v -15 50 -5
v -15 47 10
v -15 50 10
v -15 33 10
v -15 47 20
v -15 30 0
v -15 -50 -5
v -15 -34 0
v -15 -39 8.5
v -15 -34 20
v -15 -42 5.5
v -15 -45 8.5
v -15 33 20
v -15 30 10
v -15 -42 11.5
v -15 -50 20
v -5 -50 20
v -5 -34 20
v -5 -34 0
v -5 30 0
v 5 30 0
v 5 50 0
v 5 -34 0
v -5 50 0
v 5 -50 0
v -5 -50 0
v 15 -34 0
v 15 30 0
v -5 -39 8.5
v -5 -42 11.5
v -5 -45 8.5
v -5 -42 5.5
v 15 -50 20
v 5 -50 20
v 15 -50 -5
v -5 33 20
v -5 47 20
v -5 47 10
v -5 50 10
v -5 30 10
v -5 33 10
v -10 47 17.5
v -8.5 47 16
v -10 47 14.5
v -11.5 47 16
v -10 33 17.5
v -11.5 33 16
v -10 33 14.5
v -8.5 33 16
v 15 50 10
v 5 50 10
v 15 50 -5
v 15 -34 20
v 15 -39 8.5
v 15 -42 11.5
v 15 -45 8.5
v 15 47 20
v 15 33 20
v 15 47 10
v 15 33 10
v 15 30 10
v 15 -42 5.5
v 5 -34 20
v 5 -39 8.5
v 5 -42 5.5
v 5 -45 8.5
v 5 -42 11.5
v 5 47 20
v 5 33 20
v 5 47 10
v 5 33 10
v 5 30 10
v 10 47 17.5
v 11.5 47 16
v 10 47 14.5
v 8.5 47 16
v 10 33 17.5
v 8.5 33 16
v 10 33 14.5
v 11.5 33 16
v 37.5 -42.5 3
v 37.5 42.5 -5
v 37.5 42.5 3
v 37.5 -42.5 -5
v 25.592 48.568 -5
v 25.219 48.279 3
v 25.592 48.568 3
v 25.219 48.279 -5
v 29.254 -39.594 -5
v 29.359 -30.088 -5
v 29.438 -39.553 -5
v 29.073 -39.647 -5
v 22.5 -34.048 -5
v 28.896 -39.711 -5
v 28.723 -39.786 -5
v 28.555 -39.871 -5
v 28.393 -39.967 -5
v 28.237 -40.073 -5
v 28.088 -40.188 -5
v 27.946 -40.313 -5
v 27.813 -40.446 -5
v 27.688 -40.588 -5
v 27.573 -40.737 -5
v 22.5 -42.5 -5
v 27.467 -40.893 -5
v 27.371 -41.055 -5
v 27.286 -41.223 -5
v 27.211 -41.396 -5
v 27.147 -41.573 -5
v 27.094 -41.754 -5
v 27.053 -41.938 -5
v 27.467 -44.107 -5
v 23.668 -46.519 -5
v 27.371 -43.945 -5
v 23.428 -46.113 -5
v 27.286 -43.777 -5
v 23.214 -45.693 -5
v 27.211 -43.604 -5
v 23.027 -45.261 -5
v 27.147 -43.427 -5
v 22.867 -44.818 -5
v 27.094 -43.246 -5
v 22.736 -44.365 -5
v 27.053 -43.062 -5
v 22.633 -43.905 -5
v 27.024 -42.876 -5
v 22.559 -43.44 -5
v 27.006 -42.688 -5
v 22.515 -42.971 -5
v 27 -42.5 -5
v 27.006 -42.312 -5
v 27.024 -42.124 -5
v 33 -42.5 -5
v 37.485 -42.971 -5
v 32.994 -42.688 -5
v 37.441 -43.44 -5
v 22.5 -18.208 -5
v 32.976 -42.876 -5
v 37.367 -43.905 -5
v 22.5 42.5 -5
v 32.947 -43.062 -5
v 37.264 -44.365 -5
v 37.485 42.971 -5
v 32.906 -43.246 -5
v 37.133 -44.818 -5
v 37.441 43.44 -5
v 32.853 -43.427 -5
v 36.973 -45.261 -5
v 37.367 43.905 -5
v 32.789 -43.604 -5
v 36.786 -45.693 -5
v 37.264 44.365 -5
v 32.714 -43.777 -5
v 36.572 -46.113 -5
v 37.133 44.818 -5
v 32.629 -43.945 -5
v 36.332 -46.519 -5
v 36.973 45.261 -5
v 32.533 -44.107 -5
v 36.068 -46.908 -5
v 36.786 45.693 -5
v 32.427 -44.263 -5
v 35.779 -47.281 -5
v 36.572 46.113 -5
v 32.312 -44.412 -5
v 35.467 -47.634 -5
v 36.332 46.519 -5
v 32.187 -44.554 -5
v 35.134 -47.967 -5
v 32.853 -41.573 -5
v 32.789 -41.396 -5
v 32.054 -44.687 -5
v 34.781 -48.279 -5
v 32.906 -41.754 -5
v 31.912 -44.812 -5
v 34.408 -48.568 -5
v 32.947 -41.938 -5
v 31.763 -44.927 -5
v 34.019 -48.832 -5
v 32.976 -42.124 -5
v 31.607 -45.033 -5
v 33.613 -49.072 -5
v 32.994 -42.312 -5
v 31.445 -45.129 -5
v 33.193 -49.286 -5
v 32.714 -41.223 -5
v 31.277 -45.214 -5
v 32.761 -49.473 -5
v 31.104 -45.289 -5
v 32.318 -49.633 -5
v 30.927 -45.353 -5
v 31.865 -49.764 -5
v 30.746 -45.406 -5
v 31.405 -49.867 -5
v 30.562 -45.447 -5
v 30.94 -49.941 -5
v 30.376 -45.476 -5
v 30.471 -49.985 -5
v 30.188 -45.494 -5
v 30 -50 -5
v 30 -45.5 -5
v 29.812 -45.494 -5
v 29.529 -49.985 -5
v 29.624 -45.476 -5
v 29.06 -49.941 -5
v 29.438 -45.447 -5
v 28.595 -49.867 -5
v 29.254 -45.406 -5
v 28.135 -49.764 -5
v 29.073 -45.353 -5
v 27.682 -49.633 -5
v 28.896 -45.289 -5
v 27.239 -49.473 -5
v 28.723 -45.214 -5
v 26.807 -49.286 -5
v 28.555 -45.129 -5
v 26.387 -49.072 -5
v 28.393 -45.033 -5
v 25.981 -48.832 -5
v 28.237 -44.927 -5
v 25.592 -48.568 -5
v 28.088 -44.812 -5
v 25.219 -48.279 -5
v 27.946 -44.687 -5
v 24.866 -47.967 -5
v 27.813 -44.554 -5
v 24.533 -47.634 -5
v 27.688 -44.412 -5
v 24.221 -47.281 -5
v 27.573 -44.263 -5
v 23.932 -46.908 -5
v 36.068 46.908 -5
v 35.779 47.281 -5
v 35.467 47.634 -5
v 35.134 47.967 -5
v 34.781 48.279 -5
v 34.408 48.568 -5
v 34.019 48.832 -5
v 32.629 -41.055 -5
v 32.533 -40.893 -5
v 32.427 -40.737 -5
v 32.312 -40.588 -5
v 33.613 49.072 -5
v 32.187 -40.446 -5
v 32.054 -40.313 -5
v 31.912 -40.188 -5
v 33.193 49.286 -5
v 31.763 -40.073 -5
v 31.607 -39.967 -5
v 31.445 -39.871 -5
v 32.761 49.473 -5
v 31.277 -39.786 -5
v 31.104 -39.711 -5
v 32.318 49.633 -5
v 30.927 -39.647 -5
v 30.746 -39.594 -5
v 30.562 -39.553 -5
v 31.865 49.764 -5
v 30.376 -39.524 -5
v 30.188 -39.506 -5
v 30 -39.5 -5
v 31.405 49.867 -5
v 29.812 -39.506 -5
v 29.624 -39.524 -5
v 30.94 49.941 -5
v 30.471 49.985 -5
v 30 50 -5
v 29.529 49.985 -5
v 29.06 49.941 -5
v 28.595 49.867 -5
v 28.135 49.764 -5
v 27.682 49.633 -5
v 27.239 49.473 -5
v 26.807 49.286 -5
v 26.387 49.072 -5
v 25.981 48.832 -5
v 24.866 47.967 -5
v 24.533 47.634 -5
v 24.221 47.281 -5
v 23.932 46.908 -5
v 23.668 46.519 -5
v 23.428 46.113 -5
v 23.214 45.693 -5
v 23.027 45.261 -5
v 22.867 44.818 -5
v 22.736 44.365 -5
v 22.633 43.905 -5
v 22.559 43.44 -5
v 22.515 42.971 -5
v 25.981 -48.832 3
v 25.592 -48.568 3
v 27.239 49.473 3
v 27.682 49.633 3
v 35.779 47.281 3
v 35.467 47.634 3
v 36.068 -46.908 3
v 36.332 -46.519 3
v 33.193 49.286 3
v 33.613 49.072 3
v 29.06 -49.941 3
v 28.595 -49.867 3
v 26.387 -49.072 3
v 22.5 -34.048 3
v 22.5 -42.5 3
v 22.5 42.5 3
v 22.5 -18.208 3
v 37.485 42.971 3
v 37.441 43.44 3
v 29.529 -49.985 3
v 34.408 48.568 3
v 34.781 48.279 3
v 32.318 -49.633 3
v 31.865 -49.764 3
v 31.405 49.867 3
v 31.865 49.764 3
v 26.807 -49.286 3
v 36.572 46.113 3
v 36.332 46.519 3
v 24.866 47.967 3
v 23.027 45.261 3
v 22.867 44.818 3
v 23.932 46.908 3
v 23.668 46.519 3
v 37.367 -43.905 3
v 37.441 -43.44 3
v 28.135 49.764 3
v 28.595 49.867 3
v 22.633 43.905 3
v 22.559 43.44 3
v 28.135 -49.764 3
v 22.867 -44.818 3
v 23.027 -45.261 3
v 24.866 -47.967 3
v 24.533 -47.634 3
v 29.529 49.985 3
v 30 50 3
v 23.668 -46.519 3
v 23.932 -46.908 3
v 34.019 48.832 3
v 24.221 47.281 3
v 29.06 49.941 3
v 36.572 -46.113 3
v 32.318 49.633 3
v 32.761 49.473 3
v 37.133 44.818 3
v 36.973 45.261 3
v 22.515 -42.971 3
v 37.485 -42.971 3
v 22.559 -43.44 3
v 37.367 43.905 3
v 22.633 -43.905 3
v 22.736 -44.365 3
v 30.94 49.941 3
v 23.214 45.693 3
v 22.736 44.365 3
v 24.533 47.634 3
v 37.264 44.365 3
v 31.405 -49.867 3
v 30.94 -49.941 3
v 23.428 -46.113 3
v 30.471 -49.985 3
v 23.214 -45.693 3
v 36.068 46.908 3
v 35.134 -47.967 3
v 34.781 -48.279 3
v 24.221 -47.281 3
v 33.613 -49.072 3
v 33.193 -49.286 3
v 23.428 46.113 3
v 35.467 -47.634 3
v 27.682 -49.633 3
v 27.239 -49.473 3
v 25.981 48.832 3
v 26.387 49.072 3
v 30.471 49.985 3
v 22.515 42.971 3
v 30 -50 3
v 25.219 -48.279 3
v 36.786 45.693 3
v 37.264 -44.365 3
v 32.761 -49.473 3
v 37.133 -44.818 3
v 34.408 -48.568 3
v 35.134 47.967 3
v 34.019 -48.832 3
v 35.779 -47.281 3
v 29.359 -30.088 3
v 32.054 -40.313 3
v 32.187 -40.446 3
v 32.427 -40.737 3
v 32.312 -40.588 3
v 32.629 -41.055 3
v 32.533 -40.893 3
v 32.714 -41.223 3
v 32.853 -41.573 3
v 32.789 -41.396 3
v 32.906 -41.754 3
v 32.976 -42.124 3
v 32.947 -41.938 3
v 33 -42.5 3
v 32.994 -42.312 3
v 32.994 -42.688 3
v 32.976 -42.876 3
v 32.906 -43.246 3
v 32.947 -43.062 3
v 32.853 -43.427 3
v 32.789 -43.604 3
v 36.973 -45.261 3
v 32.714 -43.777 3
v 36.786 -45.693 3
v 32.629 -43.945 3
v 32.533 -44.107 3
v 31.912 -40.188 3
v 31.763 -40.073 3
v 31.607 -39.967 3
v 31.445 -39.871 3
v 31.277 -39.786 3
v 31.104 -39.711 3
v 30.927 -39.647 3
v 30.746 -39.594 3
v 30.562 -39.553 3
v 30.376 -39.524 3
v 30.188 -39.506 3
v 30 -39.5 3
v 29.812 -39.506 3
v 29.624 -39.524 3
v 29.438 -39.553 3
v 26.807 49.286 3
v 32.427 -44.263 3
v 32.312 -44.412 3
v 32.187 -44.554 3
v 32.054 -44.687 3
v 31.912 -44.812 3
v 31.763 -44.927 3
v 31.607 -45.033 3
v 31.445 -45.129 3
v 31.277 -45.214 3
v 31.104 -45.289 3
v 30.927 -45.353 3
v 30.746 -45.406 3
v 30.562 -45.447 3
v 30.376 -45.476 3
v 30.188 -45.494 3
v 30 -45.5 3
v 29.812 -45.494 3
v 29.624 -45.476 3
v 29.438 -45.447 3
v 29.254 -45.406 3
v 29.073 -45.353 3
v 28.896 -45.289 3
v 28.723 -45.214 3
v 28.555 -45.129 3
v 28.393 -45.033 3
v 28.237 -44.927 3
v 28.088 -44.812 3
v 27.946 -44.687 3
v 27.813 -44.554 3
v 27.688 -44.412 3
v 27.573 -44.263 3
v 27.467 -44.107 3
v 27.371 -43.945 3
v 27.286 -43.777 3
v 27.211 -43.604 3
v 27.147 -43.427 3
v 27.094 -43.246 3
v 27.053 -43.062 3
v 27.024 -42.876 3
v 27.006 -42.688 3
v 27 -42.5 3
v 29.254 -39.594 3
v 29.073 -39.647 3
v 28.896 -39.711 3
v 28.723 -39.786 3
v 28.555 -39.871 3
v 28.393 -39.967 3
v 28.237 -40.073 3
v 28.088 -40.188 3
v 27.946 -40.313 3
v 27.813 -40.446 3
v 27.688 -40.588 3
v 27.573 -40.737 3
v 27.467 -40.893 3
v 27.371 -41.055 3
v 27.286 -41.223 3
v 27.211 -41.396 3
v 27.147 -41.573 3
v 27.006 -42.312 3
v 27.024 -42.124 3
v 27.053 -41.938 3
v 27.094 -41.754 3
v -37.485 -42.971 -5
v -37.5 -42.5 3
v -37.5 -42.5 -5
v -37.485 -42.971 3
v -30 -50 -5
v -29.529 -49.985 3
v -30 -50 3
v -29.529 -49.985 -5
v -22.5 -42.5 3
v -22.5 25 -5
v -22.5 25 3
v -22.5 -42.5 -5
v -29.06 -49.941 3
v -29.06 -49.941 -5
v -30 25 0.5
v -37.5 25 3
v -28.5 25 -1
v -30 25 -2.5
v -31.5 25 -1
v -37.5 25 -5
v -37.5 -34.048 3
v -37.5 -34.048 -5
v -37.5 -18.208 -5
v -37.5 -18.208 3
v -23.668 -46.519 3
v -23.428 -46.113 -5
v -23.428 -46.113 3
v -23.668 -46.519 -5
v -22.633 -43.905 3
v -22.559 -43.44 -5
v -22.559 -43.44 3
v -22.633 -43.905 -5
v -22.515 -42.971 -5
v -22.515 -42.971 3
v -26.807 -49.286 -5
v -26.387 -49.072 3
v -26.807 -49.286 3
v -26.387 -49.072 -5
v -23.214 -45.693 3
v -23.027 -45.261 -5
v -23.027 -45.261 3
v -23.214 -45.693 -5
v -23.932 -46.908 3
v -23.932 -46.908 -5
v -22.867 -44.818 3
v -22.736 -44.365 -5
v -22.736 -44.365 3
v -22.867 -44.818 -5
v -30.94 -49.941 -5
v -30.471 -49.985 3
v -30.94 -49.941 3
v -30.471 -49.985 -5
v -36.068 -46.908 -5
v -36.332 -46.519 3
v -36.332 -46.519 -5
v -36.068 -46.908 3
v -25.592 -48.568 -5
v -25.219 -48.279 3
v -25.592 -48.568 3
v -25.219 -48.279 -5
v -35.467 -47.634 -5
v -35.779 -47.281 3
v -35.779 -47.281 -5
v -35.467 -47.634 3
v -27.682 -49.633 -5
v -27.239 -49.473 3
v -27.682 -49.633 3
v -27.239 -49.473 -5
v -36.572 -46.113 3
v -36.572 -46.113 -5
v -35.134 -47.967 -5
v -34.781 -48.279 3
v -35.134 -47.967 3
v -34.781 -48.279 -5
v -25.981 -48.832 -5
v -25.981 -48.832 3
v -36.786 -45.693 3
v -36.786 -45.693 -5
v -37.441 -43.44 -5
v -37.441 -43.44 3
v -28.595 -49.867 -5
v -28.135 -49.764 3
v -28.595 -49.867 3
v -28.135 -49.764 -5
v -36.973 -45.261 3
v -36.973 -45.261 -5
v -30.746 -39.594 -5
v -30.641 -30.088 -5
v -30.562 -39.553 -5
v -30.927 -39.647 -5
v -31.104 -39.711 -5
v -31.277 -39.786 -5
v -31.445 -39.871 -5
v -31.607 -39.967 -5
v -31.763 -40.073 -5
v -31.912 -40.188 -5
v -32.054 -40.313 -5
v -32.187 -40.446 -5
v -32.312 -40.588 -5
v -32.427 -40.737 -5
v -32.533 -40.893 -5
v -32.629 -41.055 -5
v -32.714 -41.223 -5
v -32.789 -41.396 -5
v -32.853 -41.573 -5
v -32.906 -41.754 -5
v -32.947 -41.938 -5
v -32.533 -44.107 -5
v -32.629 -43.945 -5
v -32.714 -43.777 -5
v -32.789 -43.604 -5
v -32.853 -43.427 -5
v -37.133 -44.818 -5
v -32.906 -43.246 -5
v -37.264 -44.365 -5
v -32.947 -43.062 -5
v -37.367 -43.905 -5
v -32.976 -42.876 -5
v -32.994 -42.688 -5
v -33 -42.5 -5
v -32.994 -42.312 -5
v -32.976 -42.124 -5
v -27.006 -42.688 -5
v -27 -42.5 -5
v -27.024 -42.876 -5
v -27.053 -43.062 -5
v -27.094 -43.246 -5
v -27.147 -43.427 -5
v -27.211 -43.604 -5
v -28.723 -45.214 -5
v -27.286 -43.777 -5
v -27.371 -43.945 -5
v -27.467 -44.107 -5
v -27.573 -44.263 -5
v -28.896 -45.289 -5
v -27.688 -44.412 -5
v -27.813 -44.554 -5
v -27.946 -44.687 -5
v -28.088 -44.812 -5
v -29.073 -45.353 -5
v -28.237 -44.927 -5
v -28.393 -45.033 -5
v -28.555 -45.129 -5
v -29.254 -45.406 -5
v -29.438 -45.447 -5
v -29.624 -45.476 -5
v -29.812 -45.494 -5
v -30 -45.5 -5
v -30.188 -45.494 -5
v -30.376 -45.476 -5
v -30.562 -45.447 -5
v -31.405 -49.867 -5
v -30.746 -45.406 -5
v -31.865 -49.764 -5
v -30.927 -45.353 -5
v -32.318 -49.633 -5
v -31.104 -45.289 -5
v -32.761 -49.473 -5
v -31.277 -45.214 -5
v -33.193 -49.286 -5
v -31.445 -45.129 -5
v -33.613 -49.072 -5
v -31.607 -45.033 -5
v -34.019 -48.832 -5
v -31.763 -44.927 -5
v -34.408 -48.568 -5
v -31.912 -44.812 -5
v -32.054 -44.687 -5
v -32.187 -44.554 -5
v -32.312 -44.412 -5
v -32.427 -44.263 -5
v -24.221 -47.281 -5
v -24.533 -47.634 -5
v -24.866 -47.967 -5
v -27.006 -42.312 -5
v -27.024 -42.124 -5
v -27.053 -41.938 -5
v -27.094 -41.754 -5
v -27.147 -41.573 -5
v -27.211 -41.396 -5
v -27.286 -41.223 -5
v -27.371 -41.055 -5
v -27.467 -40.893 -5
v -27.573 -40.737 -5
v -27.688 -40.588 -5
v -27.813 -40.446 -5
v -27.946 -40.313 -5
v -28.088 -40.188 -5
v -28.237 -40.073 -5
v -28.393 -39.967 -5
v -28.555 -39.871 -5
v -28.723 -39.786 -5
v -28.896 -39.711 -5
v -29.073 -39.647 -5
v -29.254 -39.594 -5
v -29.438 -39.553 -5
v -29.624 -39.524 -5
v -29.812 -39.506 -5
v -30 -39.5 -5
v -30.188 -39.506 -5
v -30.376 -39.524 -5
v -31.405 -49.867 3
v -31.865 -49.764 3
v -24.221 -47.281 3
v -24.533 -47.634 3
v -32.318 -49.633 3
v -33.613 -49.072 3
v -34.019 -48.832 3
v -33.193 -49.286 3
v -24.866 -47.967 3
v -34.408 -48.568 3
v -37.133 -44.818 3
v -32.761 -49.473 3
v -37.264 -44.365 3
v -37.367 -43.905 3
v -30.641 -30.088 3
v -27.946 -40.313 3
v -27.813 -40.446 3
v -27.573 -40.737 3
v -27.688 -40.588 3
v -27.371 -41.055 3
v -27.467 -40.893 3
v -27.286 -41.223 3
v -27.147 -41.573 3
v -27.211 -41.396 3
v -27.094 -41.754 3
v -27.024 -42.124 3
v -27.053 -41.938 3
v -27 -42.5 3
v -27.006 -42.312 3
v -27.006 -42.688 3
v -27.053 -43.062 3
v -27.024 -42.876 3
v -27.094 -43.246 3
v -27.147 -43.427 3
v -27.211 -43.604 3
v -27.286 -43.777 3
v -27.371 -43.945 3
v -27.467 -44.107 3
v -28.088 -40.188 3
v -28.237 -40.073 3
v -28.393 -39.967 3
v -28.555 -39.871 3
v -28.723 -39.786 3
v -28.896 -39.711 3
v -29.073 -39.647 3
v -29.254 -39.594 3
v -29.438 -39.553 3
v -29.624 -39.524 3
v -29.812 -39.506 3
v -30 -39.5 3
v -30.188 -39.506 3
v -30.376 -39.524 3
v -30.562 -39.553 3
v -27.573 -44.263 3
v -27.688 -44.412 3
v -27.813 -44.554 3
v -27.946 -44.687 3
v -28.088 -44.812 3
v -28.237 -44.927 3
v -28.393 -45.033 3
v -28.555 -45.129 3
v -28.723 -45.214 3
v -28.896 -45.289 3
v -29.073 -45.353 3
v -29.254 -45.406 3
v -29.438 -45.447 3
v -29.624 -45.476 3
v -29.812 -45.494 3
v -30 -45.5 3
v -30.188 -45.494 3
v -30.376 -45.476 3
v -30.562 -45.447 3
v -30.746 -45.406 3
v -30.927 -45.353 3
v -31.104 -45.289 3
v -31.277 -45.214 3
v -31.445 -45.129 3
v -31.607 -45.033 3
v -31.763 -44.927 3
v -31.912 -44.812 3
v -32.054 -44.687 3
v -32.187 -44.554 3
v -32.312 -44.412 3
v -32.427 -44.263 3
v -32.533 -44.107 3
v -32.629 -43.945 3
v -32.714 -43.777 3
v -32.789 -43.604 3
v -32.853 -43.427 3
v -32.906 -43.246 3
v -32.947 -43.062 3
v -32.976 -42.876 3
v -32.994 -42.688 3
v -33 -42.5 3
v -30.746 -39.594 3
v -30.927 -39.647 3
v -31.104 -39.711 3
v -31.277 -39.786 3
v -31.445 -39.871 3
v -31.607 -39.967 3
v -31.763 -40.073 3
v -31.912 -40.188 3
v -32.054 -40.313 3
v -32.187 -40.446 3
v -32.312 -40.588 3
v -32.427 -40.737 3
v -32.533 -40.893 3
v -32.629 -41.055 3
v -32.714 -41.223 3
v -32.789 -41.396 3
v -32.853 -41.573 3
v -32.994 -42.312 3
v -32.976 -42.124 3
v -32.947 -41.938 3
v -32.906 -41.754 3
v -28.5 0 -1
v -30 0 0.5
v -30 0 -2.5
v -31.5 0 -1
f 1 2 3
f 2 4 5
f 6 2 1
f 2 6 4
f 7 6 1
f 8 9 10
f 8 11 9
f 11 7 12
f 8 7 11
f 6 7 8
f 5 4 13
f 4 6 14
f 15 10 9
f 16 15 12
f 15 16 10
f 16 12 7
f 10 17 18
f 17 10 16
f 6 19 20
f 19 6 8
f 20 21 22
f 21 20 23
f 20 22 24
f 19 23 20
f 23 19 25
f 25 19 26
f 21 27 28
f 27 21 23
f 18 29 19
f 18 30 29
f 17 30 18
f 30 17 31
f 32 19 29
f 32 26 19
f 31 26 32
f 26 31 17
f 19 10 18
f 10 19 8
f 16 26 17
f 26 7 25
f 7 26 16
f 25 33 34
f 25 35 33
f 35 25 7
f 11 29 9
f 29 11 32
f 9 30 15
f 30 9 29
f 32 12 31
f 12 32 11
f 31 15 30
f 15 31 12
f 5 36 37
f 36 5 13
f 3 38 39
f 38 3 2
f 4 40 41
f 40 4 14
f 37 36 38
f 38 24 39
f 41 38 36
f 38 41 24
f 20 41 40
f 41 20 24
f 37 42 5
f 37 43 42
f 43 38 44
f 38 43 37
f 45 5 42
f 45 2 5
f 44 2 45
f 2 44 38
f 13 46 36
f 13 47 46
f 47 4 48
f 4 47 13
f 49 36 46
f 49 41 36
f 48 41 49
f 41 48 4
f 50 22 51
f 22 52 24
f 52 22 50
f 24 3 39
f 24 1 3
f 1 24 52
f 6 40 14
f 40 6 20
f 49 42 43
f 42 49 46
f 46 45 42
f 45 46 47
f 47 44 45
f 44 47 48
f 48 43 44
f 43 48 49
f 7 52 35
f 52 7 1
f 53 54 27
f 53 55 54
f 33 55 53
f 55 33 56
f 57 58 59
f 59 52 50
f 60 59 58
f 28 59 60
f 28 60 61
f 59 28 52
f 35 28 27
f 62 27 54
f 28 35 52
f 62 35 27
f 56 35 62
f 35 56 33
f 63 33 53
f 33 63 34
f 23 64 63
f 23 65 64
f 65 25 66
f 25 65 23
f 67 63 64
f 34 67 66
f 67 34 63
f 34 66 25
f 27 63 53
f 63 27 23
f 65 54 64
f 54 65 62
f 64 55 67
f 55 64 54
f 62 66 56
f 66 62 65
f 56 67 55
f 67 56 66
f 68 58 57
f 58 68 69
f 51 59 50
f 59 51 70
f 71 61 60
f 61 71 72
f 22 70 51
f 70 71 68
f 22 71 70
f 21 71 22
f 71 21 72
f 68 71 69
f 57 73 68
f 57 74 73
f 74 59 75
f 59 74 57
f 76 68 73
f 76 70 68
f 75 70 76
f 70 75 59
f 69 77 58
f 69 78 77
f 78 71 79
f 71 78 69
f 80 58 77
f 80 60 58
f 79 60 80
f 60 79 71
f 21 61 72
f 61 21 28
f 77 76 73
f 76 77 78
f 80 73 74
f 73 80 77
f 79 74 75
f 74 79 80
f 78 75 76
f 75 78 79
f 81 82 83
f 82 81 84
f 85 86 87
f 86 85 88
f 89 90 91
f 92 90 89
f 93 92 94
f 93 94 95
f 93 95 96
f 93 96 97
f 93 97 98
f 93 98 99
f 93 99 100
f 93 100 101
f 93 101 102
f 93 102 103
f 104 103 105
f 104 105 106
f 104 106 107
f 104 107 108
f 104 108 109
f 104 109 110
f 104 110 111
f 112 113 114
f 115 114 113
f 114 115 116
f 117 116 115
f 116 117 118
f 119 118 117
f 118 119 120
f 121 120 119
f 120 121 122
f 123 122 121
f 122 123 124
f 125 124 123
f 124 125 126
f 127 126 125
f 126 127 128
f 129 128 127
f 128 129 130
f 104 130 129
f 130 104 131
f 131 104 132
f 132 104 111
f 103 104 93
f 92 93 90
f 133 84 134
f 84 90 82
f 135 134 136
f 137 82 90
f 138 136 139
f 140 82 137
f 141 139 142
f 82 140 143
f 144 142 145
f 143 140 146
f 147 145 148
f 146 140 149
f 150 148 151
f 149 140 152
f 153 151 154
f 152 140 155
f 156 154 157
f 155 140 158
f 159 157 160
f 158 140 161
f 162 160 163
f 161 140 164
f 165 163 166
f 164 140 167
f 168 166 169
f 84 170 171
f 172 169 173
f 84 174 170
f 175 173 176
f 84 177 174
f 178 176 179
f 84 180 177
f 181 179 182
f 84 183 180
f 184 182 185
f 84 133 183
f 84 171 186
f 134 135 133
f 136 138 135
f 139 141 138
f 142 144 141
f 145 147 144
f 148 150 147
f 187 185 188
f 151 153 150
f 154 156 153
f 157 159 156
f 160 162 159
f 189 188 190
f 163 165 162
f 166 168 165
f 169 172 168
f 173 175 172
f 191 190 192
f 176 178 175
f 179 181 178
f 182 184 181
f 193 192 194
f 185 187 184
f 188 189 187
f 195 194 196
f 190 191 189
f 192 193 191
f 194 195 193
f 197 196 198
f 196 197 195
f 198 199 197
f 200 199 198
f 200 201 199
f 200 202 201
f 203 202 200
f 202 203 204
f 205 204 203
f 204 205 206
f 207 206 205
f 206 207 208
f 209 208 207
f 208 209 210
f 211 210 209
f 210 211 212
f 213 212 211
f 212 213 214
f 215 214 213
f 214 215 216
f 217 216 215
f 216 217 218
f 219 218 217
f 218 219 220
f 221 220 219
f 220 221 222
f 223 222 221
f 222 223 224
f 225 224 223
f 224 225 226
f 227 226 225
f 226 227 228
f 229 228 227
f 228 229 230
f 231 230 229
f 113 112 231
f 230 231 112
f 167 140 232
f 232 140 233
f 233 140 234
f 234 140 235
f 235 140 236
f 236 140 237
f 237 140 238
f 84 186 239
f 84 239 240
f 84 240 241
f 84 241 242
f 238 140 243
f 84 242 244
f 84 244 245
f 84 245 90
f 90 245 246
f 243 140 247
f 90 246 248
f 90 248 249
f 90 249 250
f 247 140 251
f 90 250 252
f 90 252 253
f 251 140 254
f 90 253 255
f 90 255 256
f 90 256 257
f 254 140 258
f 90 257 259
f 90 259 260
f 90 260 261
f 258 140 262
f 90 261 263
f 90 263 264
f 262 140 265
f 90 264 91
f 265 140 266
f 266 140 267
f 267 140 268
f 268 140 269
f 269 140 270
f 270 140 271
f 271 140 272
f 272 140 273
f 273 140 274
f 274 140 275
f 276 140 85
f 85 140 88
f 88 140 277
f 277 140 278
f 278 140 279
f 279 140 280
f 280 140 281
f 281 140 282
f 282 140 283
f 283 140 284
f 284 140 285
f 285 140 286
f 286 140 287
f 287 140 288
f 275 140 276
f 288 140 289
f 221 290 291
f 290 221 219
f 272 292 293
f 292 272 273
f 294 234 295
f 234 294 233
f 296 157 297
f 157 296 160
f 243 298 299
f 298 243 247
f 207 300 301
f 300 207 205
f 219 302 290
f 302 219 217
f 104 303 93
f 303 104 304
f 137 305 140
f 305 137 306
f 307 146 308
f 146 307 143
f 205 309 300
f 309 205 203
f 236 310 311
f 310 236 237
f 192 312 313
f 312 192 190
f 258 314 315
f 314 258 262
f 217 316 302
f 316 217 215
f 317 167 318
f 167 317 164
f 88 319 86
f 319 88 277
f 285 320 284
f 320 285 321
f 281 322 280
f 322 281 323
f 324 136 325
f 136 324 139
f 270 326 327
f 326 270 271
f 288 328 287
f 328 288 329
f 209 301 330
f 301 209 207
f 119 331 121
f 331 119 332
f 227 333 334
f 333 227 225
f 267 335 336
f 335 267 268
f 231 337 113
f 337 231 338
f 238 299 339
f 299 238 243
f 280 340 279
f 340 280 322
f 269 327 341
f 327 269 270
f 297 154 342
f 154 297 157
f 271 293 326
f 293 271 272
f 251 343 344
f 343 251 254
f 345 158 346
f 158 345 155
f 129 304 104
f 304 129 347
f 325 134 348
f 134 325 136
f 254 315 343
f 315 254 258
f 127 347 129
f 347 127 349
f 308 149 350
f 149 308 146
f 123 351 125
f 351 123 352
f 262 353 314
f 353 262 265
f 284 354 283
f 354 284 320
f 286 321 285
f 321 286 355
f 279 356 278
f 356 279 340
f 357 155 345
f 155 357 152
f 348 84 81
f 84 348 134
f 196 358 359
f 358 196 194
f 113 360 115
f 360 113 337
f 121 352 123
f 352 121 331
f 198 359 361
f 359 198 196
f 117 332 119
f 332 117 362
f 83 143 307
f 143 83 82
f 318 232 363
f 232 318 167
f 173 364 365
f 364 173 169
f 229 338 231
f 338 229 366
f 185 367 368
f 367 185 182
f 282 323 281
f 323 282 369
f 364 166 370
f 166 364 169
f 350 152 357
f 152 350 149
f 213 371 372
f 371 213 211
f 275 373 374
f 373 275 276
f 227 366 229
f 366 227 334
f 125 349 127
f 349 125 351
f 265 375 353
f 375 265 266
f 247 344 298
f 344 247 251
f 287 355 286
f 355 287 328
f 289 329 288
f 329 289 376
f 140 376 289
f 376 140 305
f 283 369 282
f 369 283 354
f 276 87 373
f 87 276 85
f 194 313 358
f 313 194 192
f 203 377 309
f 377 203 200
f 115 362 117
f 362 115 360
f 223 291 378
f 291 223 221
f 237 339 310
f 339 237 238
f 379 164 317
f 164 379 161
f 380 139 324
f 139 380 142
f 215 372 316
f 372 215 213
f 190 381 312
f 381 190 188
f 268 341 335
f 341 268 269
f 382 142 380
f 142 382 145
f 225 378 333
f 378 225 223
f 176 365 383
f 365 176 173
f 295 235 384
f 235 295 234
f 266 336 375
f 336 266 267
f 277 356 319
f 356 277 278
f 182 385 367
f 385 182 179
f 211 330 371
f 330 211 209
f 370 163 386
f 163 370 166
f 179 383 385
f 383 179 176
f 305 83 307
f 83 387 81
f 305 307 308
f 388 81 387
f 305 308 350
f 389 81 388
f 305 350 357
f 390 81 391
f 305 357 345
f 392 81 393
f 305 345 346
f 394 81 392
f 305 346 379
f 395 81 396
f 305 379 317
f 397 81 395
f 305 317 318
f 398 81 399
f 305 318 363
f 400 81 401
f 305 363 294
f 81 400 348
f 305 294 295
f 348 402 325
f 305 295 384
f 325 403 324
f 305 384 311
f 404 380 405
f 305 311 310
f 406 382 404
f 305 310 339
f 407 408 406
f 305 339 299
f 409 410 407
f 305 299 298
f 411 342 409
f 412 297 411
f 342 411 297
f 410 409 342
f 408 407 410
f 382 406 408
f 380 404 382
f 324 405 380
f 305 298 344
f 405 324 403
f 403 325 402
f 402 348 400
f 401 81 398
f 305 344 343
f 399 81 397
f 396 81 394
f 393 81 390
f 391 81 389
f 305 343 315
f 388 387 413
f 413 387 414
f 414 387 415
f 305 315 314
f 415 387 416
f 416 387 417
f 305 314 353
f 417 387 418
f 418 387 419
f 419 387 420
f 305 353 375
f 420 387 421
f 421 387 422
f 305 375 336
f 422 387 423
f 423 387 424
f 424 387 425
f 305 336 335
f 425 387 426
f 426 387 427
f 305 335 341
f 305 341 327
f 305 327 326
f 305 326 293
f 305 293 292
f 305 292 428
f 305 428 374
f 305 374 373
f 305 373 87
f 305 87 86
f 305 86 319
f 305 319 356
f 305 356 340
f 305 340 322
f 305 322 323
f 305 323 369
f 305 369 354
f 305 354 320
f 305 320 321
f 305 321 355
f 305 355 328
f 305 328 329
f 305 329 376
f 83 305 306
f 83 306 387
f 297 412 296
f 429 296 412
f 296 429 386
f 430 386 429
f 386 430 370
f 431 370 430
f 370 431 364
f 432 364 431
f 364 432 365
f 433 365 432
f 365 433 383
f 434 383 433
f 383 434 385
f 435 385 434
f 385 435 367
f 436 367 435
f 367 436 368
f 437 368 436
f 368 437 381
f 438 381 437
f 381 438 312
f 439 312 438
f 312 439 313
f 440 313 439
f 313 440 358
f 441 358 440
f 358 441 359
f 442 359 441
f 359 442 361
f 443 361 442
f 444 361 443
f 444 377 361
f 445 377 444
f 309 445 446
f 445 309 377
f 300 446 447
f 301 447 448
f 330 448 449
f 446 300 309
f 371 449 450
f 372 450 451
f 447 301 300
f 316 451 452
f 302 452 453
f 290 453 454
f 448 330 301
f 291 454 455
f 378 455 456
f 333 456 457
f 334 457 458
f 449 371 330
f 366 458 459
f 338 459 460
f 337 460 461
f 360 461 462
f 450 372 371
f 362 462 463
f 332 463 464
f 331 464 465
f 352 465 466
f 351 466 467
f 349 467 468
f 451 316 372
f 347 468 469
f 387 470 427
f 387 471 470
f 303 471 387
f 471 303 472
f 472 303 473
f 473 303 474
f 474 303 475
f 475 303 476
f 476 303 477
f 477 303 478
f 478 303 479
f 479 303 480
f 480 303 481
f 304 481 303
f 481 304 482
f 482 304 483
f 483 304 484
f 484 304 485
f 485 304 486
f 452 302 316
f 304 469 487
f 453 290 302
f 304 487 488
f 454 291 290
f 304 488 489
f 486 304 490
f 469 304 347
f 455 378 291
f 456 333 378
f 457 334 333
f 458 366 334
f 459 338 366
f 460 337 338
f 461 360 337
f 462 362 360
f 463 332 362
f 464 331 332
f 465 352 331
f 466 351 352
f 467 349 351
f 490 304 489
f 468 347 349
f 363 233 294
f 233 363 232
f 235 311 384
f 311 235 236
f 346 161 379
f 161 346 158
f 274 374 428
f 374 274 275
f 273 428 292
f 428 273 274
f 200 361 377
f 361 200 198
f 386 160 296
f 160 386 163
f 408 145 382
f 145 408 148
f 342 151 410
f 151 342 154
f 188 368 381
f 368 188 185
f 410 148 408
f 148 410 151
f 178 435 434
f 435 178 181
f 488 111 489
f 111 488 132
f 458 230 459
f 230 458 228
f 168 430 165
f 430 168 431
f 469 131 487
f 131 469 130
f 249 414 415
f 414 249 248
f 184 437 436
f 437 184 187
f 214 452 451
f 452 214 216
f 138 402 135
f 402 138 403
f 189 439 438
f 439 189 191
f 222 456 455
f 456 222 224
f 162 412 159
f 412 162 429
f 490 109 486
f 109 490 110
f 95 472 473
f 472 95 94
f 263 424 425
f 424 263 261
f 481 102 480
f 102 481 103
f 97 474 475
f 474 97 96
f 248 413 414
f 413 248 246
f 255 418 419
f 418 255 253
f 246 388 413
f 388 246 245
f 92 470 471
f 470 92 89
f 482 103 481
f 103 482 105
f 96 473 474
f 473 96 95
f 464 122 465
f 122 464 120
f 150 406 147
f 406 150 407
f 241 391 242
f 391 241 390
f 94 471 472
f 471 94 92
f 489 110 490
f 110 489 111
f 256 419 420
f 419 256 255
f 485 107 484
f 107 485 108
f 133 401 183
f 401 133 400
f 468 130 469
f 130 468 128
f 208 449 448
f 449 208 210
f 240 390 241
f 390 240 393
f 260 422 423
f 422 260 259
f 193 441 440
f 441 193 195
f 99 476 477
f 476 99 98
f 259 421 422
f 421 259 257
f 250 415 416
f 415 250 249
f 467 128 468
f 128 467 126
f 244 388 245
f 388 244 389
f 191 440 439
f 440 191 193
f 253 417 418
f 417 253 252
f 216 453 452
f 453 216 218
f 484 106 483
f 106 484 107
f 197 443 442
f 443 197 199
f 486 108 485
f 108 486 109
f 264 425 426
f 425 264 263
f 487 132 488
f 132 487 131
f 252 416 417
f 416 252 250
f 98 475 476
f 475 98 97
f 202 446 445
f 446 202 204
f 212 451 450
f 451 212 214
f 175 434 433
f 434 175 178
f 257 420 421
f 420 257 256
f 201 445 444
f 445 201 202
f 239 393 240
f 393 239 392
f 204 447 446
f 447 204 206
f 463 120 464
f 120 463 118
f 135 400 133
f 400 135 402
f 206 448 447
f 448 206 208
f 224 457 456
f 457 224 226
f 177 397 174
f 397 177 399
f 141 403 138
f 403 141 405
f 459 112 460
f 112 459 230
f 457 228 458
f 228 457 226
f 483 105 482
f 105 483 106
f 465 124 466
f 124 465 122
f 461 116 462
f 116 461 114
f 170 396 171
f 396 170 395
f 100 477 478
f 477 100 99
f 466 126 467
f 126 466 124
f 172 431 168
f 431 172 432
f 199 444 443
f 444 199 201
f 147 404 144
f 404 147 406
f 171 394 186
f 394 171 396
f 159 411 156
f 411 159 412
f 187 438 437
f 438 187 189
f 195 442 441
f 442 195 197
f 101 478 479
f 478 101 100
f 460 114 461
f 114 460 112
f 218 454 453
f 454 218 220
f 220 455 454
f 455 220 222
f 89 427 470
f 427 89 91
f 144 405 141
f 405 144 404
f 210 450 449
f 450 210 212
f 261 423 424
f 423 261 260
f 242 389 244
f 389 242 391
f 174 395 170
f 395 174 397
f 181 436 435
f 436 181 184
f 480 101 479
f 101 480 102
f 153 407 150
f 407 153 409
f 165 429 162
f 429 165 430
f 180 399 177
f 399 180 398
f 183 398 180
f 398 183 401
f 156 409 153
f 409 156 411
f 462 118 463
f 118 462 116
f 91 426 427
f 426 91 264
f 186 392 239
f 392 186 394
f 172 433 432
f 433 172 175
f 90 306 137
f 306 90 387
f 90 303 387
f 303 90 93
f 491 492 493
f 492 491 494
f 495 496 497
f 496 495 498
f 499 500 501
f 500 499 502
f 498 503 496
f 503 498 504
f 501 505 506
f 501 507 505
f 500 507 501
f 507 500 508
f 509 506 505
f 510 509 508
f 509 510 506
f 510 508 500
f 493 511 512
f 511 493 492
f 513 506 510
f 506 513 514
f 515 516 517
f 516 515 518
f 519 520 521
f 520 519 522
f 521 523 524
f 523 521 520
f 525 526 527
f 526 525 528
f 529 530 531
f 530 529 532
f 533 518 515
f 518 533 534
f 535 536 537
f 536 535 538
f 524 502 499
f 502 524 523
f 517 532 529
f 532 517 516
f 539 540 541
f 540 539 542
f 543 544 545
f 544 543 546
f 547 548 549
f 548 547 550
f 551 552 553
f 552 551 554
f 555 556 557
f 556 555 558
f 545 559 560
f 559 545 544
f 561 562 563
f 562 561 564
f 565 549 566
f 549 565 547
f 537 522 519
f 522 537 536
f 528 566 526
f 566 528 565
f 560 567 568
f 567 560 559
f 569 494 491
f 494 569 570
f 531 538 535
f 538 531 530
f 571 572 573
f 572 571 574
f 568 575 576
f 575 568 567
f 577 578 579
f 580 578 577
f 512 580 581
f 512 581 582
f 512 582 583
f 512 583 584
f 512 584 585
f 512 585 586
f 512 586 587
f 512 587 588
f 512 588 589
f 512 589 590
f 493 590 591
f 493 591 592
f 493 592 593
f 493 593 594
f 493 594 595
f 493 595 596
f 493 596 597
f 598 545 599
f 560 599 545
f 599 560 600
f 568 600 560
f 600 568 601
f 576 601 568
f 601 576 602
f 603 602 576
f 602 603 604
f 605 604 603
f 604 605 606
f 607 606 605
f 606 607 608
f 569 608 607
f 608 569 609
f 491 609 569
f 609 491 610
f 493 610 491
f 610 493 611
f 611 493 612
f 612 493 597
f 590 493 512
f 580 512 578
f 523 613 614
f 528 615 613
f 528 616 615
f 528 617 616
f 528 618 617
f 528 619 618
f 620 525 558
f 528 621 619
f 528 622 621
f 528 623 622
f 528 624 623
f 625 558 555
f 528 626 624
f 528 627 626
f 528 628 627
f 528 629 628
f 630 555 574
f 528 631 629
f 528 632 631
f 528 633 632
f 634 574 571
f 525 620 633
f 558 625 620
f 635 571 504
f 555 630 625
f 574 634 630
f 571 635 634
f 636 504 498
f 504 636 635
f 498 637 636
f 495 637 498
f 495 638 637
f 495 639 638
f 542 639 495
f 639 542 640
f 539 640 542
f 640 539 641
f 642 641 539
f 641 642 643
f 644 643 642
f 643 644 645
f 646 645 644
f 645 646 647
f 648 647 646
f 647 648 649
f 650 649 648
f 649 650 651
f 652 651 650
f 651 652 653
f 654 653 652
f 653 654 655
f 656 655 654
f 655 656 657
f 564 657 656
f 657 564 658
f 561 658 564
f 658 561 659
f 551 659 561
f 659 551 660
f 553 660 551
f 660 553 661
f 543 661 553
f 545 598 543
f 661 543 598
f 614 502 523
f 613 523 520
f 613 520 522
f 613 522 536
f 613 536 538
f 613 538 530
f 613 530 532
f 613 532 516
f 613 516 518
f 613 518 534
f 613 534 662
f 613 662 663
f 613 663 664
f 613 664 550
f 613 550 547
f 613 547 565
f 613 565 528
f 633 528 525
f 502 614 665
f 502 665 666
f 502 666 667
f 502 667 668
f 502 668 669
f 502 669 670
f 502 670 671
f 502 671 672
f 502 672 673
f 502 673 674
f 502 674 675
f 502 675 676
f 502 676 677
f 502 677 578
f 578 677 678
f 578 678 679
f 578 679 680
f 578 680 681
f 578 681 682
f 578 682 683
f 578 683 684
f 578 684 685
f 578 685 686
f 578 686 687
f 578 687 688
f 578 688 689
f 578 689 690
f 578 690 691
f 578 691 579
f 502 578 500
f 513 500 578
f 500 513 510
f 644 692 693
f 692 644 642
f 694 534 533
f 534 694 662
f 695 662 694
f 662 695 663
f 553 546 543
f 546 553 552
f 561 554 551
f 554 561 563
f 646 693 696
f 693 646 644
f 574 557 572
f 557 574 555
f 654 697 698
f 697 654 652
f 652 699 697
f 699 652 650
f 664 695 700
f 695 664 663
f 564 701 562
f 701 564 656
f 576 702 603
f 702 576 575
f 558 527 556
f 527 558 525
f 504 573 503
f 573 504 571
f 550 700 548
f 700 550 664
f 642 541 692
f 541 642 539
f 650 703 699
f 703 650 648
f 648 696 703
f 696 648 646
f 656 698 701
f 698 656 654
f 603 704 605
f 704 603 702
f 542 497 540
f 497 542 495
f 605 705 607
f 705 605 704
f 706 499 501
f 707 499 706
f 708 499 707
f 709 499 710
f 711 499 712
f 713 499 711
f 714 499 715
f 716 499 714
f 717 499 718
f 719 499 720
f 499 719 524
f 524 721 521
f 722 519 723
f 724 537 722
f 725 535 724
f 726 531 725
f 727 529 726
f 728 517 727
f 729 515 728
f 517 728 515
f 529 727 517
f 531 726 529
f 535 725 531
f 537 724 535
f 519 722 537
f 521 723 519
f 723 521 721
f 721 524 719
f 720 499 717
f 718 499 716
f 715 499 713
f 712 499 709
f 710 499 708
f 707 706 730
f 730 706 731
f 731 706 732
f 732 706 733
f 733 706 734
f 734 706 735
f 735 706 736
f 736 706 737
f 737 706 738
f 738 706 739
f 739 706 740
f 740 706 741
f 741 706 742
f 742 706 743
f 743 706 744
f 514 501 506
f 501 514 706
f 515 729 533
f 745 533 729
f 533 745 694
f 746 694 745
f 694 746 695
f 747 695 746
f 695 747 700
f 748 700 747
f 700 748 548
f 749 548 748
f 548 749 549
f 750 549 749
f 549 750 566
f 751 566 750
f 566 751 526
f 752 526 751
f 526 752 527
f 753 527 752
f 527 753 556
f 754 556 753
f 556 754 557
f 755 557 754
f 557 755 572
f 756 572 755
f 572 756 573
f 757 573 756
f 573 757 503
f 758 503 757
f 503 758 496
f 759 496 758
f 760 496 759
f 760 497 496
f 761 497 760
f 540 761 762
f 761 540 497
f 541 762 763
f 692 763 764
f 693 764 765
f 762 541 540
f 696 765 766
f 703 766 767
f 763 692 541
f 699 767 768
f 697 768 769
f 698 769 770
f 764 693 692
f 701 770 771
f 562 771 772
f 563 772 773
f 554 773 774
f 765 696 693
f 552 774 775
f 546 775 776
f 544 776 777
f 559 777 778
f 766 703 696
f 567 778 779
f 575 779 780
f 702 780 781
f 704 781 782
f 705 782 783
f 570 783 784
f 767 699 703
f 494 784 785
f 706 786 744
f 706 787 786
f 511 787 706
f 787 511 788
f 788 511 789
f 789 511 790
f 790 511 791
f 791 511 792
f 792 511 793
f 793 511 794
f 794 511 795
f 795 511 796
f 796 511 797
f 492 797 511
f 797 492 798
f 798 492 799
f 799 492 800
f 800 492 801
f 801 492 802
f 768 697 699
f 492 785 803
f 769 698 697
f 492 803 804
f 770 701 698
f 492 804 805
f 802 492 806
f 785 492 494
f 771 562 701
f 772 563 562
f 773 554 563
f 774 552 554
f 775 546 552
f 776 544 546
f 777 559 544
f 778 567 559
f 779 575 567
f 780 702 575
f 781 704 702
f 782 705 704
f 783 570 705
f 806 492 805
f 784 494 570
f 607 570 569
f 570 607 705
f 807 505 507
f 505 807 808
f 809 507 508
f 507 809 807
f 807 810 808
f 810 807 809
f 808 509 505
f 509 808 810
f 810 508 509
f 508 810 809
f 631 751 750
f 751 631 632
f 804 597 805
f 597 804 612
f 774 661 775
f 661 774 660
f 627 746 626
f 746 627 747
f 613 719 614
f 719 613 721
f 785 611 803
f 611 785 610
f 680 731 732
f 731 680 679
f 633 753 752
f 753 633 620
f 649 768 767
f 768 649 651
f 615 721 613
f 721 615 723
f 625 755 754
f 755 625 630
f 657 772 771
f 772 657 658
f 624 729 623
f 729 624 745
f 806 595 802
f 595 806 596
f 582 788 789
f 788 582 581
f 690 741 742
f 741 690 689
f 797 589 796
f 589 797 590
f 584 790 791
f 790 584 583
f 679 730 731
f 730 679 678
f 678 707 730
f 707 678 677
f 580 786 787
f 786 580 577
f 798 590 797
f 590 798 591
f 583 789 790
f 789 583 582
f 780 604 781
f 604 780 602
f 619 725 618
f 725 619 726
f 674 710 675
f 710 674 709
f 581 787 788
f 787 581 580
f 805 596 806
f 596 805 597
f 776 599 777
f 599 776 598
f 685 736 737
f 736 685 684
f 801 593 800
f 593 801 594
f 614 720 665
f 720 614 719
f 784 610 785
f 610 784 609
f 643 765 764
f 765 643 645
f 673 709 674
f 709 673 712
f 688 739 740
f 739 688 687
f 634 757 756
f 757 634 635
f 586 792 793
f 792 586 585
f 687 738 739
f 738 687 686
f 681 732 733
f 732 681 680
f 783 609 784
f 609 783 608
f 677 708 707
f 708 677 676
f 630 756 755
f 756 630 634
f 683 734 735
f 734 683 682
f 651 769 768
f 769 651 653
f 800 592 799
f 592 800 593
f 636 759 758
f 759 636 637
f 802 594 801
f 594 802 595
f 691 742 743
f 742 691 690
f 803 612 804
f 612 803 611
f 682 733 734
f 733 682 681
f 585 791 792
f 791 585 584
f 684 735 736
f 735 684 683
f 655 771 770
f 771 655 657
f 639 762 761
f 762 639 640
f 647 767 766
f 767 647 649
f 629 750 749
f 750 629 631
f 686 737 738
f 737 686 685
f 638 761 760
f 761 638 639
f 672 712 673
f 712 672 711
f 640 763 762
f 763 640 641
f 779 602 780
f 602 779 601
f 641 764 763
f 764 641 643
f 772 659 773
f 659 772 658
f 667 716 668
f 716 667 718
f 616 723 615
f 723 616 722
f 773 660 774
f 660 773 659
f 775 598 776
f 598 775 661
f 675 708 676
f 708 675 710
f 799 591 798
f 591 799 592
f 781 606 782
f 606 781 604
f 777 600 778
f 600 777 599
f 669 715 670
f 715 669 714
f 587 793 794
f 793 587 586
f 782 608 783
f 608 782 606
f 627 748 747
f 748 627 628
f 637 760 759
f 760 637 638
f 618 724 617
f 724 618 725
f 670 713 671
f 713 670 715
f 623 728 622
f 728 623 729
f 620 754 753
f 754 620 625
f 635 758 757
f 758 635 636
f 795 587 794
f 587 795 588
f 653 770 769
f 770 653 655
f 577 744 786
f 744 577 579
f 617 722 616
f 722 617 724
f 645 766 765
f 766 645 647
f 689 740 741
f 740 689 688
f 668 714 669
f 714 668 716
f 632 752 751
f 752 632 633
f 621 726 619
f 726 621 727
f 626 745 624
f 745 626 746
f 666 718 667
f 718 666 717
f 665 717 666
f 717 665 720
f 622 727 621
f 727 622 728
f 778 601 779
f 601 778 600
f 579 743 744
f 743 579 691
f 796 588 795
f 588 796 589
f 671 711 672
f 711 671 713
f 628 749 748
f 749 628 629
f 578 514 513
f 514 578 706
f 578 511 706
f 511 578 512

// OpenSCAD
// ------------------------------------------------------------------------------
//| HydroModem - Nichrome Release Mechanism                                      |
//| Copyright (C) Wayne Piekarski 2024-2025                                      |
//| https://www.waynepiekarski.net/projects/hydro-modem.htm                      |
//|                                                                              |
//| This source describes Open Hardware and is licensed under the CERN-OHL-S v2. |
//|                                                                              |
//| You may redistribute and modify this source and make products using it under |
//| the terms of the CERN-OHL-S v2 (https://ohwr.org/cern_ohl_s_v2.txt).         |
//|                                                                              |
//| This source is distributed WITHOUT ANY EXPRESS OR IMPLIED WARRANTY,          |
//| INCLUDING OF MERCHANTABILITY, SATISFACTORY QUALITY AND FITNESS FOR A         |
//| PARTICULAR PURPOSE. Please see the CERN-OHL-S v2 for applicable conditions.  |
//|                                                                              |
//| Source location: https://www.waynepiekarski.net/projects/hydro-modem.htm     |
//|                                                                              |
//| As per CERN-OHL-S v2 section 4, should You produce hardware based on this    |
//| source, You must where practicable maintain the Source Location visible      |
//| on the external case of the device or other products you make using this     |
//| source.                                                                      |
// ------------------------------------------------------------------------------

mount_width = 10; // Using 10mm square washers with M3 holes to grab onto the nichrome wire
wire_length = 10; // Gap between washers for the nichrome wire to burn
bolt_length = 20;

base = 5;
height = 20;
length = 100;
width = mount_width*2 + wire_length;

arm_height = height - 5;
arm_offset = 1; // Need clearance or the arm is a tight fit to close
bolt_height = arm_height / 2;
arm_thickness = wire_length-2;

infinity = 100;

for (copy=[-1,1]) scale([copy,1,1]) {
    // Base
    translate([0,0,-base/2])
        cube([width,length,base], center=true);

    // Mount for rotating release arm bolt
    translate([width/2-mount_width,-length/2,0]) {
        difference() {
            cube([mount_width,2*arm_thickness,height]);
            translate([0,arm_thickness,bolt_height+arm_offset])
                rotate([0,90,0])
                    cylinder(d=6, $fn=4, h=infinity, center=true);
        }
    }

    // Mount for the electrical metric bolts
    translate([-mount_width/2+mount_width/2+wire_length/2,length/2-bolt_length,0]) {
        difference() {
            union() {
                inset = 3;
                // Inset slightly so the square washers do not rotate
                translate([0,inset,mount_width])
                    color("green") cube([mount_width,bolt_length-2*inset,mount_width]);
                color("orange") cube([mount_width,bolt_length,height-mount_width]);
            }
            translate([mount_width/2,0,height-mount_width/2+arm_offset])
                rotate([90,0,0])
                    cylinder(d=3, $fn=4, h=infinity, center=true);
        }
    }
}

// The hole didn't line up and needs an 0.5mm offset to align properly.
// Use *0 or *1 there are two places where it can be enabled.
bugfix = 0.5;

// Rotating rope holding arm with rounded ends
debug = false;
color("orange")
translate(debug ? [0,bugfix*1,arm_height/2+arm_offset] : [width,0,arm_thickness/2-base]) rotate(debug ? [0,0,0] : [0,90,0])
{
    difference() {
        hull() {
            translate([0,length/2-arm_height/2,0])
                rotate([0,90,0])
                    cylinder(d=arm_height, $fn=100, h=arm_thickness, center=true);
            translate([0,-(length/2-arm_height/2),0])
                rotate([0,90,0])
                    cylinder(d=arm_height, $fn=100, h=arm_thickness, center=true);
        }
        // Bolt hole for rotation
        translate([0,-(length/2-arm_height/2-bugfix*0),0])
            rotate([0,90,0])
                cylinder(d=6, $fn=100, h=infinity, center=true);
        
        // Area for rope to pass through, needs to be at an angle
        // so the rope slides out and doesn't get caught
        tweak_angle = 15;
        tweak_ofs = 2.8;
        rope_diameter = 10;

        translate([0,-length/2+arm_height*1.5,0-arm_height/2-tweak_ofs])
            rotate([0,90,0])
                rotate([0,0,tweak_angle])
                cylinder(d=rope_diameter*2, $fn=4, h=infinity, center=true);
    }
}

// Rotating rope holding arm with bolt end to not burn from nichrome
// TODO: Currently will be at an angle since the nichrome wire is higher than axis of rotation
debug2 = false;
color("cyan")
translate(debug2 ? [0,bugfix*1,arm_height/2+arm_offset] : [-width,0,arm_thickness/2-base]) rotate(debug2 ? [0,0,0] : [0,90,0])
{
    difference() {
        hull() {
            // -5mm to ensure the arm never interferes with the nichrome mount
            translate([0,length/2-arm_height/2-bolt_length-5,0])
                rotate([0,90,0])
                    cube([arm_height,arm_height,arm_thickness], center=true);
            translate([0,-(length/2-arm_height/2),0])
                rotate([0,90,0])
                    cylinder(d=arm_height, $fn=100, h=arm_thickness, center=true);
        }
        // Mounting hole to fasten M3 bolt to rest against the nichrome wire
        rotate([90,0,0])
            translate([0,0,-infinity/2])
                cylinder(d=3, $fn=4, h=infinity, center=true);
        
        // Bolt hole for rotation
        translate([0,-(length/2-arm_height/2-bugfix*0),0])
            rotate([0,90,0])
                cylinder(d=6, $fn=100, h=infinity, center=true);
        
        // Area for rope to pass through, needs to be at an angle
        // so the rope slides out and doesn't get caught
        tweak_angle = 15;
        tweak_ofs = 2.8;
        rope_diameter = 10;

        translate([0,-length/2+arm_height*1.5,0-arm_height/2-tweak_ofs])
            rotate([0,90,0])
                rotate([0,0,tweak_angle])
                cylinder(d=rope_diameter*2, $fn=4, h=infinity, center=true);
    }
}
